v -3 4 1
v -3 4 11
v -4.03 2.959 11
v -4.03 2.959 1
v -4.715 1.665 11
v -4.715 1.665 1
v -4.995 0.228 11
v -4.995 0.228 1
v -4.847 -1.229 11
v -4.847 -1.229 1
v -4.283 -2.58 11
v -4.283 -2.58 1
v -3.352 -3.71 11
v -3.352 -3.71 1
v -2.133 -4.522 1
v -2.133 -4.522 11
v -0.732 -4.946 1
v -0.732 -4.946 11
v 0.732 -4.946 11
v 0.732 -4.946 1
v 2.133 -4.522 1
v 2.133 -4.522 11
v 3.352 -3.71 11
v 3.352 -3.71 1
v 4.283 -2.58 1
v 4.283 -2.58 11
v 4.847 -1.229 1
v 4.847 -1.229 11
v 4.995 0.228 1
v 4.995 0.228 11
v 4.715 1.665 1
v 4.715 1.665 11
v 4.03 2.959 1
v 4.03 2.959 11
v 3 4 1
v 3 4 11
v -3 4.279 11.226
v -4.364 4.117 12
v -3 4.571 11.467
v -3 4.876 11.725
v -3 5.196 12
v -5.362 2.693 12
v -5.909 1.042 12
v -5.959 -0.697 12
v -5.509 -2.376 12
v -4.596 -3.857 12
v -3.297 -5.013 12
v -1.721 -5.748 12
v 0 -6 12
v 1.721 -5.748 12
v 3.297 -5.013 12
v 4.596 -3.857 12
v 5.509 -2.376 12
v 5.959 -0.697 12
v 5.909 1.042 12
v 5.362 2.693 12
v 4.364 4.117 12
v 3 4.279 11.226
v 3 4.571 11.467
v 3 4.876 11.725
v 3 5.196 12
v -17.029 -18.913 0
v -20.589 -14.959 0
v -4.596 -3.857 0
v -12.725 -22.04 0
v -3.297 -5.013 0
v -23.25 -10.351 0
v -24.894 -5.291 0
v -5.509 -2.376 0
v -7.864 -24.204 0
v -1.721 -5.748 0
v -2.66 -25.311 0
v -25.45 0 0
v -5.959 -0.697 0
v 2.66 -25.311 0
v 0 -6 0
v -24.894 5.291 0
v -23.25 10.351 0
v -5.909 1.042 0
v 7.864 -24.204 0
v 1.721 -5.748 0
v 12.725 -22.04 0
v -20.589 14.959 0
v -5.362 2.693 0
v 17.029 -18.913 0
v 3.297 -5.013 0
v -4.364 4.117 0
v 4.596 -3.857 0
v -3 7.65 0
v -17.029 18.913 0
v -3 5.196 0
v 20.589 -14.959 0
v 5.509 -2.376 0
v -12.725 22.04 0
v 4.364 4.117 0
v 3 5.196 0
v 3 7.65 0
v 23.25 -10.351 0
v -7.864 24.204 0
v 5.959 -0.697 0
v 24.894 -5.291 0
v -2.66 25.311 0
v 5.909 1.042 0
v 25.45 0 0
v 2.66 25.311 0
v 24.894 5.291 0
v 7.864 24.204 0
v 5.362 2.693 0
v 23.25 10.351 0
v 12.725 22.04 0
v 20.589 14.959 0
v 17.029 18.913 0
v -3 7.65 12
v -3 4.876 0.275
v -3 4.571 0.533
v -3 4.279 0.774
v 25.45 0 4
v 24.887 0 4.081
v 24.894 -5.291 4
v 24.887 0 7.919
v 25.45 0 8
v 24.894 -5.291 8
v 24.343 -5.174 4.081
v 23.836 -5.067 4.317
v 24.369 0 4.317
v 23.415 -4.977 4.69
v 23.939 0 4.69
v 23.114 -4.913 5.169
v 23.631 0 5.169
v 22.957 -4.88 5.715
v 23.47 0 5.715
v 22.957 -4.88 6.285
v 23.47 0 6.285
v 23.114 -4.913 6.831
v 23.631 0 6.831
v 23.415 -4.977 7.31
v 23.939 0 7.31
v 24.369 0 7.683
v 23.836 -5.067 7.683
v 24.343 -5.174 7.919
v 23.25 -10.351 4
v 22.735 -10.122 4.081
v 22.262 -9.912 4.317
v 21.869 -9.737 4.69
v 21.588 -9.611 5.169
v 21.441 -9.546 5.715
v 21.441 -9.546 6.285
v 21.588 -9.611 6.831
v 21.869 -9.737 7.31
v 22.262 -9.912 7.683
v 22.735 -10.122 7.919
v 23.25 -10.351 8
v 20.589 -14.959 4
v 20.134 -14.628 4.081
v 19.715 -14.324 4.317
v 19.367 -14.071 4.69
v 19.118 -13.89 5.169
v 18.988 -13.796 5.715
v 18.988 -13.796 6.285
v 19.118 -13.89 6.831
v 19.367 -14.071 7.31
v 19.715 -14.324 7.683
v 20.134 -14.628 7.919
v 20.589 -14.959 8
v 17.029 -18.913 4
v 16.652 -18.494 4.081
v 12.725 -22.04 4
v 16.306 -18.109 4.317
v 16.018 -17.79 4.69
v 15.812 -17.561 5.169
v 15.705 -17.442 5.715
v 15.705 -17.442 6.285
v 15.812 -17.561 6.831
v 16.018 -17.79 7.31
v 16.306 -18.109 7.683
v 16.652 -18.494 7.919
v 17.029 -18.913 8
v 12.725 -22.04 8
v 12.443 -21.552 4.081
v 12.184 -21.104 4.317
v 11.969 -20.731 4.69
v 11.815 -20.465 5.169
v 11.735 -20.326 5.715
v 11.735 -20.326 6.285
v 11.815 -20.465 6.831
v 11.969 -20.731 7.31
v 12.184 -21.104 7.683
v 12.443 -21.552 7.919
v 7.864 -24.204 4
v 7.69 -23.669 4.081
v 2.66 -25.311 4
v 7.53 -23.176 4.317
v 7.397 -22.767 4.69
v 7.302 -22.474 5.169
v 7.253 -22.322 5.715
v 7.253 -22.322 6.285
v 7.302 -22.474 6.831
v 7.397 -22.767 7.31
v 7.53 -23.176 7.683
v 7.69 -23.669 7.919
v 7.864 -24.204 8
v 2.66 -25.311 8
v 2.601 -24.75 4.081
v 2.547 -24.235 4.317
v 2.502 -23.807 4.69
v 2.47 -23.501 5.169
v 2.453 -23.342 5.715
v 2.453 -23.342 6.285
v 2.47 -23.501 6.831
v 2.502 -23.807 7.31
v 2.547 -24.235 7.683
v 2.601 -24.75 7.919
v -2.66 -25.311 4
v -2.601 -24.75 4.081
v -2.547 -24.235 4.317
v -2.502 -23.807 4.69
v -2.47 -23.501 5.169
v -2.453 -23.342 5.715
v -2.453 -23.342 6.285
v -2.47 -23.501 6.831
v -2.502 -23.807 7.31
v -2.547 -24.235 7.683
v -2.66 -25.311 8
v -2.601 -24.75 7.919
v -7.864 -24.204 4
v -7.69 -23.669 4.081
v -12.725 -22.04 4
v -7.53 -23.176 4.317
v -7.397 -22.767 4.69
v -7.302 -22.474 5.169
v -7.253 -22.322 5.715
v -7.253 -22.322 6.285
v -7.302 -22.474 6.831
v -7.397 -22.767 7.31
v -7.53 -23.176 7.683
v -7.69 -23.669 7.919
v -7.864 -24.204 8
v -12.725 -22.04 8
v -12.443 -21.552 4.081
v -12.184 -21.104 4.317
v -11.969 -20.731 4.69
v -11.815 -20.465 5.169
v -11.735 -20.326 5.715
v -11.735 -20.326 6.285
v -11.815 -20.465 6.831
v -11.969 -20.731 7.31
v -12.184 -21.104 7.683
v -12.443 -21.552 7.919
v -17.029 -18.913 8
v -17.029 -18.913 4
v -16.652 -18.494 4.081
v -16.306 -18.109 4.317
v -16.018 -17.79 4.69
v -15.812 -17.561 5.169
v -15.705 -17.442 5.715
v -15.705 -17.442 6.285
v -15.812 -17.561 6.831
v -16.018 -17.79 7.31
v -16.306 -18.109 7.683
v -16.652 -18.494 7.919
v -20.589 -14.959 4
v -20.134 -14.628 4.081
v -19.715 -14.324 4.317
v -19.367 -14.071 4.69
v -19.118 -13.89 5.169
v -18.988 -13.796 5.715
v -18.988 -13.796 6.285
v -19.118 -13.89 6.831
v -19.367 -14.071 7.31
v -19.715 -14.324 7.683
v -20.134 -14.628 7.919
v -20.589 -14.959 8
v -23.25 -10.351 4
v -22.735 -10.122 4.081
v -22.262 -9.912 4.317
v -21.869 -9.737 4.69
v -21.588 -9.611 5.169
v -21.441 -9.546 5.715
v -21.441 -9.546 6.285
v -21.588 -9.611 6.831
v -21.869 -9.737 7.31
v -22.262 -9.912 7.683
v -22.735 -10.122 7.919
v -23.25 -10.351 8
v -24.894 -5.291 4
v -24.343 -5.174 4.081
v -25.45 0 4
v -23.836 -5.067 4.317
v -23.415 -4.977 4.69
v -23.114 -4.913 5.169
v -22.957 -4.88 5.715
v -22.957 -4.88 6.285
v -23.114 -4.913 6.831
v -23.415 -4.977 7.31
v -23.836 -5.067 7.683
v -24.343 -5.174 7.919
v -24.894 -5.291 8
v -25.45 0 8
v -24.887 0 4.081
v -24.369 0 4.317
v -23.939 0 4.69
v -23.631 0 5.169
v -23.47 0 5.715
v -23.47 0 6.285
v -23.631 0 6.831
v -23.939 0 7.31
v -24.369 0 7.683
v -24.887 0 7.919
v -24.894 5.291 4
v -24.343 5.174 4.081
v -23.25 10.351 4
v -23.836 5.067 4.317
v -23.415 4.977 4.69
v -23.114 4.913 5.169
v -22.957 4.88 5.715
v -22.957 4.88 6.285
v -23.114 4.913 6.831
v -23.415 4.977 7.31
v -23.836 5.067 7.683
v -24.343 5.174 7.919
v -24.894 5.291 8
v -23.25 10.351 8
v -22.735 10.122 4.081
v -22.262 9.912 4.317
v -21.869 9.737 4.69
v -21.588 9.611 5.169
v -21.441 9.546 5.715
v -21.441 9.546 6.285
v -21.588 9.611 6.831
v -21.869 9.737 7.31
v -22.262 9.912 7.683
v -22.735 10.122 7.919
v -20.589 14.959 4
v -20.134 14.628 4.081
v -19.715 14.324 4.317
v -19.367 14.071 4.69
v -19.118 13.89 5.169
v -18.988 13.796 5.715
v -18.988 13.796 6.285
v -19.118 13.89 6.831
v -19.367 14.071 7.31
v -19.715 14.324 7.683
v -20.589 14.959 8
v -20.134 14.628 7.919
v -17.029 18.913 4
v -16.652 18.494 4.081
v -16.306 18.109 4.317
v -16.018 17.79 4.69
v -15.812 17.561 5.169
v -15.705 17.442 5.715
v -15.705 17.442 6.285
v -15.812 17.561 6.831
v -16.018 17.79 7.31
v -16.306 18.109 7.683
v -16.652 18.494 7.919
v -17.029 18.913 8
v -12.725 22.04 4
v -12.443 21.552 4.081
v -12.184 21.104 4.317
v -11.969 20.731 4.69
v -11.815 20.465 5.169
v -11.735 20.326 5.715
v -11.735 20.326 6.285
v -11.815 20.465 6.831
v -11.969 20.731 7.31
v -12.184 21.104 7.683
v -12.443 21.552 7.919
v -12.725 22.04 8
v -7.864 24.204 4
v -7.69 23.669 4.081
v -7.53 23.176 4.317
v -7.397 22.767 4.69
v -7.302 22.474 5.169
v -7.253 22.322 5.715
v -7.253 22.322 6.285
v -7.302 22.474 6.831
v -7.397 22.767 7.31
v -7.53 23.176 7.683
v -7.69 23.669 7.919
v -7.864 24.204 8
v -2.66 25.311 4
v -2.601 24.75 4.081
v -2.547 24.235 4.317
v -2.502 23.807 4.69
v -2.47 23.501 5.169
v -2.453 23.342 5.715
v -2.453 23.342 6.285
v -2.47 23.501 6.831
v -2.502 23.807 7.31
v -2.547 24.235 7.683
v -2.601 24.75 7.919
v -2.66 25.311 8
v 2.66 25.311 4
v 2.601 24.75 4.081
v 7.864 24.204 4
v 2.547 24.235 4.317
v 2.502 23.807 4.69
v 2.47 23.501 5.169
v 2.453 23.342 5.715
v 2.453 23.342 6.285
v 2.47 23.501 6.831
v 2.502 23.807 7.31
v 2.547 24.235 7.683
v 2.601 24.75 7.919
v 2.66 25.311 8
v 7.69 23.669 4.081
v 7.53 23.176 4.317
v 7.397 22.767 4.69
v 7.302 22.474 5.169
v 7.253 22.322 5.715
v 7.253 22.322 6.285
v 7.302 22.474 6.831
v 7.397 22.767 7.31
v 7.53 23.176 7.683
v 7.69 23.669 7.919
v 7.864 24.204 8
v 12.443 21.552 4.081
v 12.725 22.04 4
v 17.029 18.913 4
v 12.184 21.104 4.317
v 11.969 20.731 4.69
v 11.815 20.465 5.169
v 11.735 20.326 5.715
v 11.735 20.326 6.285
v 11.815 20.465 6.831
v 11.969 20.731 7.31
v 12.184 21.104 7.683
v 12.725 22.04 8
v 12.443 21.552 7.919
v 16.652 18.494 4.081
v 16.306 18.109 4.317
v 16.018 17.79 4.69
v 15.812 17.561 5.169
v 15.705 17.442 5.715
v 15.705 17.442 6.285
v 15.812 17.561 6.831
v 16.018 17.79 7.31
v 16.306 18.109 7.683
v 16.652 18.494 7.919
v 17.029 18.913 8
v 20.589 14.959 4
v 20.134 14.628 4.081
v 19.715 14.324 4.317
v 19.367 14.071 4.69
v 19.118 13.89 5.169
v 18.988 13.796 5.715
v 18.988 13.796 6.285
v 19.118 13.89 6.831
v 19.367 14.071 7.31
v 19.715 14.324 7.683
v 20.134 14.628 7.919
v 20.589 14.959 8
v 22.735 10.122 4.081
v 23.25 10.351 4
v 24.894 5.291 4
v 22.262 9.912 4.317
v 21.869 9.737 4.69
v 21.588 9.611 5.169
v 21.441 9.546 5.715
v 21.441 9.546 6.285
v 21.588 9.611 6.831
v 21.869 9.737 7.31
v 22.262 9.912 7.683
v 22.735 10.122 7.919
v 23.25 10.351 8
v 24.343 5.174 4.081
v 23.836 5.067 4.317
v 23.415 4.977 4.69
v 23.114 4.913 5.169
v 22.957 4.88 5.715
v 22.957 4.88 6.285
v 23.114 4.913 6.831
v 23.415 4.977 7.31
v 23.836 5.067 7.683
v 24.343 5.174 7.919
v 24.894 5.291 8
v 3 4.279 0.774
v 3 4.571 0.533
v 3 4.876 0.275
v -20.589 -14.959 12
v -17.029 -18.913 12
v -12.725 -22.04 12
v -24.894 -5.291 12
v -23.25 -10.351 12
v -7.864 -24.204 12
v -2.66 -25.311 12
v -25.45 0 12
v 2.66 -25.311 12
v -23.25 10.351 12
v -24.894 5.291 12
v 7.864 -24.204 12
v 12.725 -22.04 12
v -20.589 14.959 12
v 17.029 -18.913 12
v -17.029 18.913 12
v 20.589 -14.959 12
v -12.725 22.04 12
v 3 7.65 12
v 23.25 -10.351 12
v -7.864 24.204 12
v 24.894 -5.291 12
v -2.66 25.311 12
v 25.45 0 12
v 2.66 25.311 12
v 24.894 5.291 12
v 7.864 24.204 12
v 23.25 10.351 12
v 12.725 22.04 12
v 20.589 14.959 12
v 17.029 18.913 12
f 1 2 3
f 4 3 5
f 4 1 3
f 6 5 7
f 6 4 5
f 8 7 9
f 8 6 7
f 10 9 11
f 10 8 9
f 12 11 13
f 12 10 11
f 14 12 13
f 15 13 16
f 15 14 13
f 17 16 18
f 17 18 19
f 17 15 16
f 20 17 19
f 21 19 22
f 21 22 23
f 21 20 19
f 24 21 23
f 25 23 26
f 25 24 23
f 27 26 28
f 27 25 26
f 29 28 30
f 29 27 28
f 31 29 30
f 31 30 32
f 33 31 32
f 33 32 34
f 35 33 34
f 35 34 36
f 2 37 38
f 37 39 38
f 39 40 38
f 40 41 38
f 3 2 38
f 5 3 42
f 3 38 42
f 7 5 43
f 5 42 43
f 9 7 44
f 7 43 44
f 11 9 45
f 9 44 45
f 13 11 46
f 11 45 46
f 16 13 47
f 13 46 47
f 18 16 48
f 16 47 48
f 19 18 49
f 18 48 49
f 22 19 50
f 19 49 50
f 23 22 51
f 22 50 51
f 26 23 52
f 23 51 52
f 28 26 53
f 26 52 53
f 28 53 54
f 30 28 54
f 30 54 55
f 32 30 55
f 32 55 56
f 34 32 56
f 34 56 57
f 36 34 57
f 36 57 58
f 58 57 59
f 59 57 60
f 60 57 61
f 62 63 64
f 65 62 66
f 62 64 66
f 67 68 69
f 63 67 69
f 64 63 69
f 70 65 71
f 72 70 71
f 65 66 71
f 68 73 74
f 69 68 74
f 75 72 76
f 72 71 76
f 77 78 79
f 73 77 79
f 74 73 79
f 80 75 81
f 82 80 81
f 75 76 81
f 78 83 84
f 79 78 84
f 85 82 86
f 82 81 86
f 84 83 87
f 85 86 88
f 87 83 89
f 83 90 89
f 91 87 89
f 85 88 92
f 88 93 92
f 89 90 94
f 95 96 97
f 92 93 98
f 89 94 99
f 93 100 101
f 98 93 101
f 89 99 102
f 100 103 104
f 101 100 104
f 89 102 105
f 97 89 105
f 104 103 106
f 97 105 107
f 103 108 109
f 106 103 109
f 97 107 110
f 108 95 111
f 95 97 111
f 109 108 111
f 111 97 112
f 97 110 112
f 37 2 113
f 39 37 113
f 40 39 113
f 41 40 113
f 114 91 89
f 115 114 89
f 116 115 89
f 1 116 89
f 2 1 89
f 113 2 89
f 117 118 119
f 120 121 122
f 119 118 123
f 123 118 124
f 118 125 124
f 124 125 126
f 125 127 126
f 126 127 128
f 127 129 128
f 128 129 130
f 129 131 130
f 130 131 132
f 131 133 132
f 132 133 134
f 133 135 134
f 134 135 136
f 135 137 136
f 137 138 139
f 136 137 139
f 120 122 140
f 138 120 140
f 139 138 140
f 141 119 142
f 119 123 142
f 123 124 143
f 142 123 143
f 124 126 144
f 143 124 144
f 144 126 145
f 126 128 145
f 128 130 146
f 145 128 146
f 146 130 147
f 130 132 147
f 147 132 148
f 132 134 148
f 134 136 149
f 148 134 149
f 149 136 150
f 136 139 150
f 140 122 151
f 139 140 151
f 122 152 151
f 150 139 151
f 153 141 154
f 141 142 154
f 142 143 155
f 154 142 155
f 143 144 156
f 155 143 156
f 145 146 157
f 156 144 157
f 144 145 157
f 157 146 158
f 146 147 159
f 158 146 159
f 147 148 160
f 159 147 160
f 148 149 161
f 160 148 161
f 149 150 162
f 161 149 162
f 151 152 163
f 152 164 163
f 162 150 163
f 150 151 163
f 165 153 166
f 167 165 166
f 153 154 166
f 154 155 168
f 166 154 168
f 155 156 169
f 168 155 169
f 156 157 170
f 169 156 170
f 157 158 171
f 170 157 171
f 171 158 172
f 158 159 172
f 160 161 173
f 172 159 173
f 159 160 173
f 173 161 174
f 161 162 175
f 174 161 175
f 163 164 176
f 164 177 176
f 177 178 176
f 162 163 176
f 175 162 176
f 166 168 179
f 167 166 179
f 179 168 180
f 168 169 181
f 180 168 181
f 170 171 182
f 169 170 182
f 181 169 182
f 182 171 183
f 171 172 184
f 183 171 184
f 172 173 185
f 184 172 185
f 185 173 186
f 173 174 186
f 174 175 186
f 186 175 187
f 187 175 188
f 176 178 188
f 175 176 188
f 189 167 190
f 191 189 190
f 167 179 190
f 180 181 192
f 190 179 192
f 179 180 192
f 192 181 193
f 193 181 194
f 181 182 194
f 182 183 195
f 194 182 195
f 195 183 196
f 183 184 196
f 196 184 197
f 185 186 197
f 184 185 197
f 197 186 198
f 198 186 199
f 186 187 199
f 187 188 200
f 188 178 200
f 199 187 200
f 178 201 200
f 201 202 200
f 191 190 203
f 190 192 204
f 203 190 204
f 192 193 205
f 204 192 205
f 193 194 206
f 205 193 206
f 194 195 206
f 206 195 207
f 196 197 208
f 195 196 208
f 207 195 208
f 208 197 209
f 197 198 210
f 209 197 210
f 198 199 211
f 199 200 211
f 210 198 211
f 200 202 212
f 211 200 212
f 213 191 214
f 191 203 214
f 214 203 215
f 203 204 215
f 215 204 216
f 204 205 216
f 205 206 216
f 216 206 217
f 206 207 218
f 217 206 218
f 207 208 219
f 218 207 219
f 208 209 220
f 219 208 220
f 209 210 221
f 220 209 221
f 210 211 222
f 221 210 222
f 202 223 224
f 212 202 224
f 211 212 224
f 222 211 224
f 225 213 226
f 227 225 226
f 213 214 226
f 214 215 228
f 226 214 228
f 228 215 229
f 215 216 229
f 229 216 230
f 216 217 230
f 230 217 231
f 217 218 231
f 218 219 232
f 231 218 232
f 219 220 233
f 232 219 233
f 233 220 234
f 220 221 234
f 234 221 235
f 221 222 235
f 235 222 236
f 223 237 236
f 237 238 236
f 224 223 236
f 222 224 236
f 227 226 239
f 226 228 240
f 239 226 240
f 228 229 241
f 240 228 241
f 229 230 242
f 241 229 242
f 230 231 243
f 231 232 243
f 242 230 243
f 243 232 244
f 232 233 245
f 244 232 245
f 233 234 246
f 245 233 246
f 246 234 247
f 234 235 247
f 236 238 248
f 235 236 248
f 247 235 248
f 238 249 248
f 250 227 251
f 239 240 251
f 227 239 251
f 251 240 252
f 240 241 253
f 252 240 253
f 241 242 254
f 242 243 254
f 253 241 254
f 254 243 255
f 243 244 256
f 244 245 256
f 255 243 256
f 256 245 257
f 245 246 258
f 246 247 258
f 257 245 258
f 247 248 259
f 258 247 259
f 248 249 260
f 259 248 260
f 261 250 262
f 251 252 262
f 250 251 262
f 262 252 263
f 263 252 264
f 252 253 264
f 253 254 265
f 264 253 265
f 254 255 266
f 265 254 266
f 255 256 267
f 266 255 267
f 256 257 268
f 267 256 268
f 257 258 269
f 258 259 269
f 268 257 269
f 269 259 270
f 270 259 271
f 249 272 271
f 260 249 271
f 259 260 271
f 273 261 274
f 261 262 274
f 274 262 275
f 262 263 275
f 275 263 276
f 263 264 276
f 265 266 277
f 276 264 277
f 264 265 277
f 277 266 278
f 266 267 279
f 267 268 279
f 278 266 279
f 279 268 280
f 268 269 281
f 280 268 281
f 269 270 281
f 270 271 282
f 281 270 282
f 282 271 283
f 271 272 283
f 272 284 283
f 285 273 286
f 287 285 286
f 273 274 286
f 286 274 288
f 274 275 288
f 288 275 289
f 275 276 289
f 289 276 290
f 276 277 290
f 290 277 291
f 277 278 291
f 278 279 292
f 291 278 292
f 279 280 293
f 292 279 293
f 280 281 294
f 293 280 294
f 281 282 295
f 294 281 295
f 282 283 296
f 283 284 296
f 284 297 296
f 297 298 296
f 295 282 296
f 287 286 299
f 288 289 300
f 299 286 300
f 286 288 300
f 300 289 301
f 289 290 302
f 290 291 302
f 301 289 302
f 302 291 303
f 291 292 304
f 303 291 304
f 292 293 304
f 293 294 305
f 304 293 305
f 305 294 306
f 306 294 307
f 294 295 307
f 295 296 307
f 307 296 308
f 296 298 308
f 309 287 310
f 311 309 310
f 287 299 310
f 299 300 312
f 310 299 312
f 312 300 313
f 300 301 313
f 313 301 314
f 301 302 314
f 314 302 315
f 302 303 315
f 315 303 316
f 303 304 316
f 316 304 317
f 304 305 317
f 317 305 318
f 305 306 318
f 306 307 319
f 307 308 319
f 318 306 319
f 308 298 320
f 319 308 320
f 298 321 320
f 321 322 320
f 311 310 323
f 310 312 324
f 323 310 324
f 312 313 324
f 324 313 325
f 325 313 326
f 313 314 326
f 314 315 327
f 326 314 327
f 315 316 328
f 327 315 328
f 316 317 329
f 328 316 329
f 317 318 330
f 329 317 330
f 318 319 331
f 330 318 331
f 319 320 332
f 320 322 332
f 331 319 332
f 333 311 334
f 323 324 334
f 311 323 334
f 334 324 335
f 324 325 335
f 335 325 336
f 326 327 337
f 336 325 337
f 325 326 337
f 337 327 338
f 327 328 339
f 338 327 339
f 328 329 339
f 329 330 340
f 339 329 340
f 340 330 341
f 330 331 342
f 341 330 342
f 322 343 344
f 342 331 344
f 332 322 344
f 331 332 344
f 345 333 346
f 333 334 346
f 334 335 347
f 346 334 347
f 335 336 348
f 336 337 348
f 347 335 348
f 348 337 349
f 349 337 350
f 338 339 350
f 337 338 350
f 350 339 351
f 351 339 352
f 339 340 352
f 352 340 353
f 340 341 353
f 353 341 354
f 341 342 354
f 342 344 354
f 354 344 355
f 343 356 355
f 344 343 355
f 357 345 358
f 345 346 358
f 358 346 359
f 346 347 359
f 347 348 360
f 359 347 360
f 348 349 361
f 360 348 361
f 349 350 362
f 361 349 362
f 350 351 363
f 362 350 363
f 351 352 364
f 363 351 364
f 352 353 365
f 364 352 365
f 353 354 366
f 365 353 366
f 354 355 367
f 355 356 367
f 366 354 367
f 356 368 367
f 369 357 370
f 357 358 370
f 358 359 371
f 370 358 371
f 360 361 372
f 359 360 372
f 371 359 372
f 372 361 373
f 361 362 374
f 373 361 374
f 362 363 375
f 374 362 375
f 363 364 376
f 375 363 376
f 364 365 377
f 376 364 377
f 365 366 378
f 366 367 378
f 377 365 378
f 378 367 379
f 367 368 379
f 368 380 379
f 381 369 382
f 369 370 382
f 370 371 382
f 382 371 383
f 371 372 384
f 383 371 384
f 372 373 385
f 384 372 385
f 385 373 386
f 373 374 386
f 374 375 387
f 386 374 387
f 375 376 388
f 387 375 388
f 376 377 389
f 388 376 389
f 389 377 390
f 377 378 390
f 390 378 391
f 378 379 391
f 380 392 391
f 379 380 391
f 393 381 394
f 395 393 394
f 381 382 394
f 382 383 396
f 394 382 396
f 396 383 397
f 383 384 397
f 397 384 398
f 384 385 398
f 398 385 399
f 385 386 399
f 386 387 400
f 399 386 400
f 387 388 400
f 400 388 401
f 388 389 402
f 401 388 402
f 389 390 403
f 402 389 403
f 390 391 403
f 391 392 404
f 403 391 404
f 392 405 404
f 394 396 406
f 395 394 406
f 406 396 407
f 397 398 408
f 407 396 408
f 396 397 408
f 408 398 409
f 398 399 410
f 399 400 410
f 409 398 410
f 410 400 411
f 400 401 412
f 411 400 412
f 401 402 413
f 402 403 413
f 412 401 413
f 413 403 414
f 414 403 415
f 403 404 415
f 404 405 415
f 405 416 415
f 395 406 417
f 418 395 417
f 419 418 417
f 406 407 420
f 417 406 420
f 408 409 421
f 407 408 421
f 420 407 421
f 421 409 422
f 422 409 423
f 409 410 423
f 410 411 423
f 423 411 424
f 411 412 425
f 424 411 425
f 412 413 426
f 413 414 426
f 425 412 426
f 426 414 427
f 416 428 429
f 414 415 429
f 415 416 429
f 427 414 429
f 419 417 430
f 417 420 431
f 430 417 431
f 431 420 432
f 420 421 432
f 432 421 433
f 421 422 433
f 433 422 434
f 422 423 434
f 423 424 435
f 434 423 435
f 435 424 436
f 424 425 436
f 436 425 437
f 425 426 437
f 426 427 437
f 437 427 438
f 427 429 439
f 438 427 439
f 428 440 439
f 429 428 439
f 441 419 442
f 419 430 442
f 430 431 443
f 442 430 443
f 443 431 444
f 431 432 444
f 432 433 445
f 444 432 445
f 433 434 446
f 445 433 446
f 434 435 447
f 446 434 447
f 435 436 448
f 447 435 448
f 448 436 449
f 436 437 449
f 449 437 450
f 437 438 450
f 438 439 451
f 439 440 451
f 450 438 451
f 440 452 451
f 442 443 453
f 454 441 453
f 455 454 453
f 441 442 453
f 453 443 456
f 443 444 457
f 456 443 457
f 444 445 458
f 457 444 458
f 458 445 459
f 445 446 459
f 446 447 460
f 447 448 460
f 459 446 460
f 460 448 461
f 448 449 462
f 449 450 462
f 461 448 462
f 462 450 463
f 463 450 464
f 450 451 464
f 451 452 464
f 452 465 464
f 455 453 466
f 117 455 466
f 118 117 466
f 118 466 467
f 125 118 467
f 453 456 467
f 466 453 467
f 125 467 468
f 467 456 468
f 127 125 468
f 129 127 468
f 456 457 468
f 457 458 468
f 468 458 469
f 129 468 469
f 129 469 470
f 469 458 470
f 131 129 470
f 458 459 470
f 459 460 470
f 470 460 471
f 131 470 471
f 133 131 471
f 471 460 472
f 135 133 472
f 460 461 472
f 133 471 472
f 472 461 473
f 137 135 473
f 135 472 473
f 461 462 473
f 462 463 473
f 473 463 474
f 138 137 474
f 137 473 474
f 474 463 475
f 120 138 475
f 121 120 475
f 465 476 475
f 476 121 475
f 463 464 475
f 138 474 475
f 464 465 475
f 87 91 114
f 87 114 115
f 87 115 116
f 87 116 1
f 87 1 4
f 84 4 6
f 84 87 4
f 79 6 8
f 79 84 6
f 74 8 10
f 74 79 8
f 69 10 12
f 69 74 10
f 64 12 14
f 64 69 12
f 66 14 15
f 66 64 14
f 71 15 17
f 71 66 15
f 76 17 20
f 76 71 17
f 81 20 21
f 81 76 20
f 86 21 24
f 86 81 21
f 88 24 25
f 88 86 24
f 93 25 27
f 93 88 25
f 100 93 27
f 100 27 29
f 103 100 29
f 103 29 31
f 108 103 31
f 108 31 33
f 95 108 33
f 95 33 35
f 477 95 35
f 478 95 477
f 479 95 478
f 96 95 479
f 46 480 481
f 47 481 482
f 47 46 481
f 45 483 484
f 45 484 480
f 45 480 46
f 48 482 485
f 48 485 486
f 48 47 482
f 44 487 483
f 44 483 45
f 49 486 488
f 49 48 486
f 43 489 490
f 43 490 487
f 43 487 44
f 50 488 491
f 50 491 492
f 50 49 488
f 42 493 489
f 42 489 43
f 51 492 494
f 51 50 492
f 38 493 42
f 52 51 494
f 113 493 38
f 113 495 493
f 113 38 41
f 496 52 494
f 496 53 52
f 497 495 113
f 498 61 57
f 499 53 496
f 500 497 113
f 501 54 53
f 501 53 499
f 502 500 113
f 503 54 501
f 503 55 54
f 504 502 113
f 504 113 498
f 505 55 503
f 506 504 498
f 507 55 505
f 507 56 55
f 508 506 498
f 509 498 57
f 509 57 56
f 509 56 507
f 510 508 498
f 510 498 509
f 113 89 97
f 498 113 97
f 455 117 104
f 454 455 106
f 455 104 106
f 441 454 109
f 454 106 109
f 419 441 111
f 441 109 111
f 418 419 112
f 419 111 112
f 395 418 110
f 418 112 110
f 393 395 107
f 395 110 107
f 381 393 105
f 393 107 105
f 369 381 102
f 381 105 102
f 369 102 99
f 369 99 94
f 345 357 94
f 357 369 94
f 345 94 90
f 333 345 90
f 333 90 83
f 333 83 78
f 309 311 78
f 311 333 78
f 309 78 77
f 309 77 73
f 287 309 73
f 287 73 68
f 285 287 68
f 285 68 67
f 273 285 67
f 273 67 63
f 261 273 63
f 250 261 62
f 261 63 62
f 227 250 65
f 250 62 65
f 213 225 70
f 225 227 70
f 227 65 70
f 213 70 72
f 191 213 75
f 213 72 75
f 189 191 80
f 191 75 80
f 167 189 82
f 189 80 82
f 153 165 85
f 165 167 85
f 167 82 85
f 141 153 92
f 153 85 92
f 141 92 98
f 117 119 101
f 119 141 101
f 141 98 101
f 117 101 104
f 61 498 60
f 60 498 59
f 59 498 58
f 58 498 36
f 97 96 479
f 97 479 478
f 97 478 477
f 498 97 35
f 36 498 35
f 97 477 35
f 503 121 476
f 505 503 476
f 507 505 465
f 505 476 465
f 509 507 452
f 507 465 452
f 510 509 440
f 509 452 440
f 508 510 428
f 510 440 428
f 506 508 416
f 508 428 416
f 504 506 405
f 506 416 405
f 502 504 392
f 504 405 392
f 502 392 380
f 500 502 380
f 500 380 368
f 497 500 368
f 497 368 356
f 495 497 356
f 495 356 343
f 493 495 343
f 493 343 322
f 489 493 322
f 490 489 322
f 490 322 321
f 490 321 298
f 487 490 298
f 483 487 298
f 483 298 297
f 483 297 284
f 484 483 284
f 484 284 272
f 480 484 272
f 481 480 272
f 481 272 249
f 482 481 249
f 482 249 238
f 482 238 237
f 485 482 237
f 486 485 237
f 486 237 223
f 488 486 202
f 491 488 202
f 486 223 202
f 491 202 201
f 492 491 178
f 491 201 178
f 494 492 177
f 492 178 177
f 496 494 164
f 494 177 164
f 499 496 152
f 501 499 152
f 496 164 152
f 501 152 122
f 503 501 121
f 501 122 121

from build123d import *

# Parameters (mm, degrees)
SKETCH_3_R          = 25.45
SKETCH_3_R_2        = 5
EXTRUDE_1_DEPTH     = 12
CHAMFER_1_SIZE      = 1
CUT_EXTRUDE_1_DEPTH = 19
SKETCH_6_R          = 2


with BuildPart() as part:
    # 草图3 → 凸台-拉伸1 (new body)
    with BuildSketch(Plane.XY):
        Circle(SKETCH_3_R)
        Circle(SKETCH_3_R_2, mode=Mode.SUBTRACT)
    extrude(amount=EXTRUDE_1_DEPTH)

    # 倒角1
    chamfer_1_edges = [part.edges().sort_by_distance(p)[0] for p in [
        (-5, 0, 0),
        (-5, 0, 12),
    ]]
    chamfer(chamfer_1_edges, length=CHAMFER_1_SIZE)

    # 草图8 → 切除-拉伸1 (cut)
    with BuildSketch(Plane(origin=(0, 0, 0), x_dir=(-1, 0, 0), z_dir=(0, 0, -1))):
        Polygon((0, 7.65), (-3, 7.65), (-3, 0), (0, 0), (3, 0), (3, 7.65), align=None)
    extrude(amount=-CUT_EXTRUDE_1_DEPTH, mode=Mode.SUBTRACT)

    # 草图6 → 切除-旋转1 (revolve, cut)
    with BuildSketch(Plane(origin=(0, 0, 0), x_dir=(1, 0, 0), z_dir=(0, 1, 0))):
        with Locations((25.45, -6)):
            Circle(SKETCH_6_R)
    revolve(axis=Axis((0, 0, 0), (0, 0, -1)), mode=Mode.SUBTRACT)


solid = part.part
